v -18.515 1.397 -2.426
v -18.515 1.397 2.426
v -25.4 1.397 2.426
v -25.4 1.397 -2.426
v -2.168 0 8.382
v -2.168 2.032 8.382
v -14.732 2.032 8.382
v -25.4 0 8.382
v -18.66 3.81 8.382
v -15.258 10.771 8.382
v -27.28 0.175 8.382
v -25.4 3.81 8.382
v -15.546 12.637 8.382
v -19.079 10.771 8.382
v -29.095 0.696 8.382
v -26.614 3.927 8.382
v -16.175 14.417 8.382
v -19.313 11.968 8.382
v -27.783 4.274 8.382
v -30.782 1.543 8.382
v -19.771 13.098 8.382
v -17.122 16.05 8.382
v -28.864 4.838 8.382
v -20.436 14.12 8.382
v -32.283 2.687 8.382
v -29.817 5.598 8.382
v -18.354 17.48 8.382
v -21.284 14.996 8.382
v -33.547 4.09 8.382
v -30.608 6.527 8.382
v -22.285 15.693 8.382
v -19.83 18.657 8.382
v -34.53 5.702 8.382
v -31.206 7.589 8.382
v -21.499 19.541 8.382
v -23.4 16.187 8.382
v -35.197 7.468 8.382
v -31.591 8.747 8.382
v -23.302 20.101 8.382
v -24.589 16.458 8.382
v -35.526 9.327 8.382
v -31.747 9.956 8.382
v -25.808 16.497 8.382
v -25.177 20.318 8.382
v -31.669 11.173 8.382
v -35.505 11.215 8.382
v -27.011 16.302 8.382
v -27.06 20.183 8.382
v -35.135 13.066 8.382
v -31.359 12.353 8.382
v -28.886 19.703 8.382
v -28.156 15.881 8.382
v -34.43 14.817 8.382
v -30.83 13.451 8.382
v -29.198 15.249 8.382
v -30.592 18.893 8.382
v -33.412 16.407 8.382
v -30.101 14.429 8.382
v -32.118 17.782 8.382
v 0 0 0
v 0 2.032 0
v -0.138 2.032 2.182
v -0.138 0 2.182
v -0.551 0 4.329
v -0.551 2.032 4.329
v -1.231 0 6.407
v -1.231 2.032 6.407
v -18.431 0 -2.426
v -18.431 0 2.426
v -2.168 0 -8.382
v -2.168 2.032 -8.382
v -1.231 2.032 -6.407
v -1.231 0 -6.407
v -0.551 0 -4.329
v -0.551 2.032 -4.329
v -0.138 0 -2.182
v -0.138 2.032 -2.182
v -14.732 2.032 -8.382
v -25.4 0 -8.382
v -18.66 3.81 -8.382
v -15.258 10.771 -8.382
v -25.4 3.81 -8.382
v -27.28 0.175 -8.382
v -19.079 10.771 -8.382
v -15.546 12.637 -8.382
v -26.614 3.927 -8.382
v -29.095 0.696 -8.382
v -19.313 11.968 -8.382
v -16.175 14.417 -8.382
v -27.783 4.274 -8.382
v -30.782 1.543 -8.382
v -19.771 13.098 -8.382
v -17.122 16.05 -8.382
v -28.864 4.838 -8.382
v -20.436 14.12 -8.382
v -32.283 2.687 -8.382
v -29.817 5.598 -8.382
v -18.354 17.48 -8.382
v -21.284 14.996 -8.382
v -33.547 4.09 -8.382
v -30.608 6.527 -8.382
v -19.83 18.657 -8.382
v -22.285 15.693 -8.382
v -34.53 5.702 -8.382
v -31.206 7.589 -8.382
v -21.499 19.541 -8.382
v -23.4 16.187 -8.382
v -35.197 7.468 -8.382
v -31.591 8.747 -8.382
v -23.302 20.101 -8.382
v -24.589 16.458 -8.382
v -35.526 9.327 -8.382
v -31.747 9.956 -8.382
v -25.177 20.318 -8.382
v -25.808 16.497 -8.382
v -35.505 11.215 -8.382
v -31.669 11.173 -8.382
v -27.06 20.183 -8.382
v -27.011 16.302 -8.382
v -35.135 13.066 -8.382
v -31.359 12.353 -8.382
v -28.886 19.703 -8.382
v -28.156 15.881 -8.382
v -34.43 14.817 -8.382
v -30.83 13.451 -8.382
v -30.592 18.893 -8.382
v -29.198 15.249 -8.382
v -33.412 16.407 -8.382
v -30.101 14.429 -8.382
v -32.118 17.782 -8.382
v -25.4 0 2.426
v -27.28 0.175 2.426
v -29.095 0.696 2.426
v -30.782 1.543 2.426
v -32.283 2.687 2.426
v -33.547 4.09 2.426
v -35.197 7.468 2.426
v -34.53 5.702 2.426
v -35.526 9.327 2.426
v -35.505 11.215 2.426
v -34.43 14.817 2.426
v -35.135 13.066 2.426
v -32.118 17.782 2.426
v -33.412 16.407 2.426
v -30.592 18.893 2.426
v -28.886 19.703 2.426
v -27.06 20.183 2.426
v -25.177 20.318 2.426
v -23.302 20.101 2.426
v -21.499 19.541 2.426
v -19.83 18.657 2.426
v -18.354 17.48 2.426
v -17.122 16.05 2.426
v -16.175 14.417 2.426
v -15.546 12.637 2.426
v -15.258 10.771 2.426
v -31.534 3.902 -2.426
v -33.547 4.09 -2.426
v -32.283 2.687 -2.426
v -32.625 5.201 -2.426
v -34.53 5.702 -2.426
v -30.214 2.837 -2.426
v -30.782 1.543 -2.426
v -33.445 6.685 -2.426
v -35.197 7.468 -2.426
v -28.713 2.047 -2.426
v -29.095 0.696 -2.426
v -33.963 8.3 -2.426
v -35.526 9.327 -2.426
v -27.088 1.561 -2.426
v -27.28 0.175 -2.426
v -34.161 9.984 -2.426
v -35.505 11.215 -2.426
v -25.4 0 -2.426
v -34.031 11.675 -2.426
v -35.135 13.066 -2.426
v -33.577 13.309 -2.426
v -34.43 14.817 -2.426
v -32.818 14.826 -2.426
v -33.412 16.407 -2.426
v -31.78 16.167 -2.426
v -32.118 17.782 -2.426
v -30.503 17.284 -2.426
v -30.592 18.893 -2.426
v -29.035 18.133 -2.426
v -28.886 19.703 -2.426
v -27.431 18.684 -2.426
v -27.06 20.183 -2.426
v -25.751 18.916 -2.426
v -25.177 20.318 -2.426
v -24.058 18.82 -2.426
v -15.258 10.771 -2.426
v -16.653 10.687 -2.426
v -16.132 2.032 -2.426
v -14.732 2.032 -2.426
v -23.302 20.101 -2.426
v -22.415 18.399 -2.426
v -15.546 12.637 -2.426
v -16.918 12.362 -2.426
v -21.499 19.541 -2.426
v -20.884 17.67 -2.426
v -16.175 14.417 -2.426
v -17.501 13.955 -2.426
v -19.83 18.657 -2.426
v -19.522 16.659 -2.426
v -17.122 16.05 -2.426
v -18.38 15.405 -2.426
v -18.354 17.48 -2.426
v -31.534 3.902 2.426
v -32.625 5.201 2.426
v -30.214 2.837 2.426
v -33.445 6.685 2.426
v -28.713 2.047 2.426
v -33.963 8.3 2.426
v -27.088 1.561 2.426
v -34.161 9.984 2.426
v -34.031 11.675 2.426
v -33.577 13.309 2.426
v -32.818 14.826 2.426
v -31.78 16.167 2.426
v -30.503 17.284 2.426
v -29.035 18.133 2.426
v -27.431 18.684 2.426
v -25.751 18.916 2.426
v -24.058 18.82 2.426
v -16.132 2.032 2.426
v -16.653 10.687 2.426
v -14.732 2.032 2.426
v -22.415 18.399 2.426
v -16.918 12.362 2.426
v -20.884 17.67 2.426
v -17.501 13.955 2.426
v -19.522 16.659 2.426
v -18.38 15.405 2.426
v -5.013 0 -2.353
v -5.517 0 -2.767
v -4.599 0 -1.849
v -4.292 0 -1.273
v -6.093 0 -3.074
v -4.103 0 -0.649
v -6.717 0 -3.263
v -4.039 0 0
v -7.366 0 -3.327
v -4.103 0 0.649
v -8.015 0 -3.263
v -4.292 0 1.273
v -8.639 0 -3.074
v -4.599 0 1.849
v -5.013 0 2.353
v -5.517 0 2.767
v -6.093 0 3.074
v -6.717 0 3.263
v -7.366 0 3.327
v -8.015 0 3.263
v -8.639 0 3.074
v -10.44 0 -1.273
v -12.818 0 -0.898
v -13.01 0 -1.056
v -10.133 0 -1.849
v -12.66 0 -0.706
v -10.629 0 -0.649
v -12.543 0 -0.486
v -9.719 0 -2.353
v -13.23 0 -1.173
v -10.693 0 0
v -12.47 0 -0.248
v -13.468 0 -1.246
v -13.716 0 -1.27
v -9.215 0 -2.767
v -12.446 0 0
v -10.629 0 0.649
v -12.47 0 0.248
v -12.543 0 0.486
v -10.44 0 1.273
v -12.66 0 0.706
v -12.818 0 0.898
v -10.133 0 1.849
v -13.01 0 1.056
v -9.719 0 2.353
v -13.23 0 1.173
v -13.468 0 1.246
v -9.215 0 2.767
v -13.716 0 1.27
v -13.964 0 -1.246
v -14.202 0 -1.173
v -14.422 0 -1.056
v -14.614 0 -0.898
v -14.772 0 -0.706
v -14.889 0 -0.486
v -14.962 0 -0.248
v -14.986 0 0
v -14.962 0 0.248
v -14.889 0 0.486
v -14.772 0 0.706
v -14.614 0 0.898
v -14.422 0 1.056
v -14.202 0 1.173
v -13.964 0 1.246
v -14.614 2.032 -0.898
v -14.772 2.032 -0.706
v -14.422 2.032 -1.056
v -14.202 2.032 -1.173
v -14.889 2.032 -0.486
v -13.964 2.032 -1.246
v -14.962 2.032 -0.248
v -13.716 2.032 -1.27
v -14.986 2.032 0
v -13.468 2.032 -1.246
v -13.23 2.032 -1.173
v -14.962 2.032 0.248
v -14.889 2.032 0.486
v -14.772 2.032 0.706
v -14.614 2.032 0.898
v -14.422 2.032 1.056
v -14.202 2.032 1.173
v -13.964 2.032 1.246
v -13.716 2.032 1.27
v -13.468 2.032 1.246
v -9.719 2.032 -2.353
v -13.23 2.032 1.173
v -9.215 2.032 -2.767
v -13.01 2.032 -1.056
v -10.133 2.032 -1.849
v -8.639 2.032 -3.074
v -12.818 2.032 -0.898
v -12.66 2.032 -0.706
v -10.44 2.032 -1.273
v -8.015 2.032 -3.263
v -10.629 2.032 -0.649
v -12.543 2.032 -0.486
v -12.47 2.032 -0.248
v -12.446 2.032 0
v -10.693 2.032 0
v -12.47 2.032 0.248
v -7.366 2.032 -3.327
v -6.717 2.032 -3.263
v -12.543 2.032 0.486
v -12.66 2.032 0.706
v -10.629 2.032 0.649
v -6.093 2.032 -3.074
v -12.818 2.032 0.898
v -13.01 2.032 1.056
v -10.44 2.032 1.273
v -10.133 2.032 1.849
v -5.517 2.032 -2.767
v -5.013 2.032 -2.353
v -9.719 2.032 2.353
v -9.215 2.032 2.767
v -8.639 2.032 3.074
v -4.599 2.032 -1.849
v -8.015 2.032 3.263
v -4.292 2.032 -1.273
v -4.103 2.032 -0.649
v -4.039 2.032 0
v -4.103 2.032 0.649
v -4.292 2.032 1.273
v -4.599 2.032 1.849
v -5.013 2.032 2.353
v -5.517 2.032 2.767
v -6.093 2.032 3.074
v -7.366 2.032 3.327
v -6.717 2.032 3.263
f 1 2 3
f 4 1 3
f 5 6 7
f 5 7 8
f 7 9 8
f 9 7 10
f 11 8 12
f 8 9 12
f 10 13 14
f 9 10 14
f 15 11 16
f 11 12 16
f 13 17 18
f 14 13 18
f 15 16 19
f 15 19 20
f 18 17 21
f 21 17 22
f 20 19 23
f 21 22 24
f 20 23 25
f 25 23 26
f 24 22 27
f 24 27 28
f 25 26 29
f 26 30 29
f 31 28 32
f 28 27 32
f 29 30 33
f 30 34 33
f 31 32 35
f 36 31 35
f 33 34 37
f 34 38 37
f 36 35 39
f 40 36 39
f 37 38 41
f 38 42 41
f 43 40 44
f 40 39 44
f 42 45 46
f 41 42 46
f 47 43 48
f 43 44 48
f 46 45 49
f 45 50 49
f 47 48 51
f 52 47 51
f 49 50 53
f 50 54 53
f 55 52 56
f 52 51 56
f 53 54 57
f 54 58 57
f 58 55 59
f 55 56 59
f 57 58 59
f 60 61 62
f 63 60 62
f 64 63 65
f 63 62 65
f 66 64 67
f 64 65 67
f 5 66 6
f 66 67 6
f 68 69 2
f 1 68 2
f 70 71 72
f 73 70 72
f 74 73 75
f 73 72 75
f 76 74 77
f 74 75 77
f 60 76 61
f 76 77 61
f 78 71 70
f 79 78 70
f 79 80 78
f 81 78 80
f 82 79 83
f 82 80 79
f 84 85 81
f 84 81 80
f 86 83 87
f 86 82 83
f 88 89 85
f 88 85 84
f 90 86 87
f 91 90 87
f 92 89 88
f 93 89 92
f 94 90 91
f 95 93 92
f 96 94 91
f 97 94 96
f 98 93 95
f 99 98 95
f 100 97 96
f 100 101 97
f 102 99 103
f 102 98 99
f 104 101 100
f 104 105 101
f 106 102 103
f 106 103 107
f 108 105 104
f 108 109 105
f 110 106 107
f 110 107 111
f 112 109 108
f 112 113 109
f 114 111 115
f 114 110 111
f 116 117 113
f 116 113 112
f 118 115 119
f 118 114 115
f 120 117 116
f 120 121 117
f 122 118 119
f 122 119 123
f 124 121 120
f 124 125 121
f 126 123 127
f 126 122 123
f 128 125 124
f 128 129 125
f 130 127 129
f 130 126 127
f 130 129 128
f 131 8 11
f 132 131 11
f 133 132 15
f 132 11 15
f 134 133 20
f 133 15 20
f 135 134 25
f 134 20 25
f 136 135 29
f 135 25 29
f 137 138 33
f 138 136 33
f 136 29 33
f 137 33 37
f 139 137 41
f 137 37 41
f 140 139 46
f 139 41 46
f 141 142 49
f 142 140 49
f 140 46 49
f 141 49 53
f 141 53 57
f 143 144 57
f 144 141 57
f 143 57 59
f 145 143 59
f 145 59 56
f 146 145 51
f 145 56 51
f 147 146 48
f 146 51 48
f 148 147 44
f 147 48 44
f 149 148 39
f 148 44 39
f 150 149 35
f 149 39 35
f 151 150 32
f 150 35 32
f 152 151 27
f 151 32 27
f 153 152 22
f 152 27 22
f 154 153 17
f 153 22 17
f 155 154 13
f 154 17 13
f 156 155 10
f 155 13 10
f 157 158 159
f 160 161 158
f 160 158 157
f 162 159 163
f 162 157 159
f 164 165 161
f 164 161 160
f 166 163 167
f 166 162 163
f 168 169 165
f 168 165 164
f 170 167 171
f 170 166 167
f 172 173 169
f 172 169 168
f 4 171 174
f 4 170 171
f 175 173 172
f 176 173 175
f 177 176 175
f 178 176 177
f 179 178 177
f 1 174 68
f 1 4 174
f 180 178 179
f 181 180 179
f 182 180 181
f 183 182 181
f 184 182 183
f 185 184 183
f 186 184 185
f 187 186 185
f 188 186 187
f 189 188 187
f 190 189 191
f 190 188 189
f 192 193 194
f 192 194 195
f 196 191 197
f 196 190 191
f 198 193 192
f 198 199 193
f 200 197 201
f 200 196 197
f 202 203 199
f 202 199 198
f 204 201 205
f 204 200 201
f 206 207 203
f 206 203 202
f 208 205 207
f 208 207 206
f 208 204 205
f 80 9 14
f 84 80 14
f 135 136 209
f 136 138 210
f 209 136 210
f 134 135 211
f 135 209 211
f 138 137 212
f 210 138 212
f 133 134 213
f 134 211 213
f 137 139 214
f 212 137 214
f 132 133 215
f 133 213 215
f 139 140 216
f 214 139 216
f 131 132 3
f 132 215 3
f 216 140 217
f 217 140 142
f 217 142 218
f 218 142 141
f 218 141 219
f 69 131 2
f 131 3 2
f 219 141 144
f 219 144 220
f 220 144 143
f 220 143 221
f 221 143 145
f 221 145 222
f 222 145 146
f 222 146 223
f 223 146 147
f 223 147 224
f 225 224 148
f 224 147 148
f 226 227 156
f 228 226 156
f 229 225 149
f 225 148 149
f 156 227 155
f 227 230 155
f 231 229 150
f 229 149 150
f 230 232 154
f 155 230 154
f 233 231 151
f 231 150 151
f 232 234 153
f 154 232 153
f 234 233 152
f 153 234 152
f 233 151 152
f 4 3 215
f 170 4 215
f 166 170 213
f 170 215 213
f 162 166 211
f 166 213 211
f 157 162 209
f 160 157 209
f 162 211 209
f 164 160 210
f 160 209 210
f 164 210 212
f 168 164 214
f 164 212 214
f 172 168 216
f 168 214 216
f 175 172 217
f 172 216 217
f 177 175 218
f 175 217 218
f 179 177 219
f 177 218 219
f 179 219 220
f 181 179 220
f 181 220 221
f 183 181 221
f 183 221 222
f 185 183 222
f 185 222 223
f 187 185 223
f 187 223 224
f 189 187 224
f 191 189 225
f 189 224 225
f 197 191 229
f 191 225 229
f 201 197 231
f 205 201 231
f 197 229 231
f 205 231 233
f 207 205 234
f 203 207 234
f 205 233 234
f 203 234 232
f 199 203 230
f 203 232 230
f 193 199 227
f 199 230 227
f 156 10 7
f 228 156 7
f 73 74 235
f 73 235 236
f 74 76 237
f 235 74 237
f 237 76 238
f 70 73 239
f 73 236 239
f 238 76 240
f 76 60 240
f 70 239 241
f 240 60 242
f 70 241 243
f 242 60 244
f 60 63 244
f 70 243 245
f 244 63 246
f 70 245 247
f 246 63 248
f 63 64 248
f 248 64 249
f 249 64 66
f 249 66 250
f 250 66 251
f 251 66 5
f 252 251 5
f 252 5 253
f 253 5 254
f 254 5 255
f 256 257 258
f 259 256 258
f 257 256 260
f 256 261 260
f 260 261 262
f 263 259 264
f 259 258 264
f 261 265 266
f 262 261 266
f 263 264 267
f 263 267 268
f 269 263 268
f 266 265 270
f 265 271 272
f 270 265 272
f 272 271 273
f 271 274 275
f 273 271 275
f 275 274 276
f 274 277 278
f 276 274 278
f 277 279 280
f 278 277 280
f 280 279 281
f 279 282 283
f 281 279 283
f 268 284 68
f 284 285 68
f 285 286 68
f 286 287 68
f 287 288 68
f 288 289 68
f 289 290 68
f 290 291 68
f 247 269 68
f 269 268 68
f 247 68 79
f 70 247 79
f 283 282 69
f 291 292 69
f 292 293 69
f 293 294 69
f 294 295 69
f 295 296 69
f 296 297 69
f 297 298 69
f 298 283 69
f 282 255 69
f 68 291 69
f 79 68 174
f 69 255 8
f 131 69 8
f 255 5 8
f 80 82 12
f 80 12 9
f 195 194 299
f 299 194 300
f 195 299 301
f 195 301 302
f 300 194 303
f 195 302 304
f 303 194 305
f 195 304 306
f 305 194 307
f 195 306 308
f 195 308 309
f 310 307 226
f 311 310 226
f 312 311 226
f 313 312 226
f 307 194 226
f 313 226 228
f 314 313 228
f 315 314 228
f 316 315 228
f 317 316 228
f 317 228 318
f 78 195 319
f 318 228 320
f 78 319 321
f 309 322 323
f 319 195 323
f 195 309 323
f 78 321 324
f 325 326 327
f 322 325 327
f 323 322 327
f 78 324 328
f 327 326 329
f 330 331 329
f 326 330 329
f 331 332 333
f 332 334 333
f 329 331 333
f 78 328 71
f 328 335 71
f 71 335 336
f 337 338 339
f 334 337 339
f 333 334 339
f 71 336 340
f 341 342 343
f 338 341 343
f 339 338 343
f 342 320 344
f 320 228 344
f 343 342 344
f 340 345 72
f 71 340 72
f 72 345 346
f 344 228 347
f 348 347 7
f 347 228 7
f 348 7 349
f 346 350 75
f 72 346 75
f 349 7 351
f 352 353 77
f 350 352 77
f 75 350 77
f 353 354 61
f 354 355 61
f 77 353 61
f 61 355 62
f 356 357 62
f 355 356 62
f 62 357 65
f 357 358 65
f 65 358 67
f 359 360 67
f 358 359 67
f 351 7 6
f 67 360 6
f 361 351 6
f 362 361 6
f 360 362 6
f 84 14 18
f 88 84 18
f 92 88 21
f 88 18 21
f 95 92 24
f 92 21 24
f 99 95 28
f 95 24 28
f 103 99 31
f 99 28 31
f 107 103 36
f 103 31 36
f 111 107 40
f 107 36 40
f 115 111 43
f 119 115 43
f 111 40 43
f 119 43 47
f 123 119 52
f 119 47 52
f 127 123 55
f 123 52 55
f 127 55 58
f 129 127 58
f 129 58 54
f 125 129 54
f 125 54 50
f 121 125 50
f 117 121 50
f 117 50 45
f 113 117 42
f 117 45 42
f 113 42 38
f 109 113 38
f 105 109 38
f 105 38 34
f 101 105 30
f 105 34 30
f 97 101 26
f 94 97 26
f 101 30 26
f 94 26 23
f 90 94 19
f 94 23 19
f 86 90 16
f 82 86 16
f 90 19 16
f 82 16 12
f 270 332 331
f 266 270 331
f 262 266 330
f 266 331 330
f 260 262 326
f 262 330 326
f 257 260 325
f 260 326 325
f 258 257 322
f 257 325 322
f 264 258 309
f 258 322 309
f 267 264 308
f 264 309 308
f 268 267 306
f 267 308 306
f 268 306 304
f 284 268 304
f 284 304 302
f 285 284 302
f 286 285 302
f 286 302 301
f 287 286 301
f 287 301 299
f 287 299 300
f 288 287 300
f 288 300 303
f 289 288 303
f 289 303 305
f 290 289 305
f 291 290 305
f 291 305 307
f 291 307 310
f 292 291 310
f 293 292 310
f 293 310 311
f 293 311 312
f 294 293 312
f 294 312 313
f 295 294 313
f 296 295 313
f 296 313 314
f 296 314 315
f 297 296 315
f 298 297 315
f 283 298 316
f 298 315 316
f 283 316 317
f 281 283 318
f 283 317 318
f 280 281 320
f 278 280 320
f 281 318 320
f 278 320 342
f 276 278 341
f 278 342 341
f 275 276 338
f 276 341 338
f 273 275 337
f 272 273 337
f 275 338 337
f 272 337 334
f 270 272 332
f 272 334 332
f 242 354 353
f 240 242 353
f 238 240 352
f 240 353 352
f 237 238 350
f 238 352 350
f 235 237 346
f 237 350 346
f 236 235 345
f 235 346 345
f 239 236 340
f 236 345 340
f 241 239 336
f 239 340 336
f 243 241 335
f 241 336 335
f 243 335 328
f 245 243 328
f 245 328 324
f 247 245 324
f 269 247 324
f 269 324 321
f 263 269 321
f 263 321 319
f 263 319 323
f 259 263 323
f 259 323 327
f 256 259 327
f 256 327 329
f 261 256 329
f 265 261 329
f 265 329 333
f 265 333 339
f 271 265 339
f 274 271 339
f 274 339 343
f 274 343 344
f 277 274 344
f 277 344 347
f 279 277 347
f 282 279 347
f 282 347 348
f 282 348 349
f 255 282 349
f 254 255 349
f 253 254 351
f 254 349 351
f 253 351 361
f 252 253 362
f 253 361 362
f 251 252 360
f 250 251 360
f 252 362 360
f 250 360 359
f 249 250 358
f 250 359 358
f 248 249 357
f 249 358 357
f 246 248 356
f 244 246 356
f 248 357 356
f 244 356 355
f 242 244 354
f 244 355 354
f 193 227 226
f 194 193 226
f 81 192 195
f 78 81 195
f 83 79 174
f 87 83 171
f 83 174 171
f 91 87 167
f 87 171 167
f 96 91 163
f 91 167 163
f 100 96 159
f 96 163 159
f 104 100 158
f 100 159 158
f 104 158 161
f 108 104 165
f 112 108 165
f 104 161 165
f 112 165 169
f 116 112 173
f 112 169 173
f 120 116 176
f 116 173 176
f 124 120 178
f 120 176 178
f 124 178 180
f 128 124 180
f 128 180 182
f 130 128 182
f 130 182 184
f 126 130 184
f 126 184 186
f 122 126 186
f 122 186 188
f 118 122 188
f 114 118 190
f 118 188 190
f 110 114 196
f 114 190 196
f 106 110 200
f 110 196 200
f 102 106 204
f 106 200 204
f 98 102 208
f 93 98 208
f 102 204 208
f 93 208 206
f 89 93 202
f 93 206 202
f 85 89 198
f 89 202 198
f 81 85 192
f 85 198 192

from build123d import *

# Parameters (mm, degrees)
BOSS_EXTRUDE1_DEPTH = 8.382
CUT_EXTRUDE2_DEPTH  = 2.032
SKETCH4_R           = 3.3274
SKETCH4_R_2         = 1.27
CUT_EXTRUDE3_DEPTH  = 3.032
CUT_EXTRUDE4_DEPTH  = 2.4257


with BuildPart() as part:
    # Sketch1 → Boss-Extrude1 (new body, symmetric)
    with BuildSketch(Plane.XY):
        with BuildLine():
            Line((0, 0), (-25.4, 0))
            ThreePointArc((-25.4, 0), (-32.797029365, 17.124880227), (-15.258381189, 10.77087469))
            Line((-15.258381189, 10.77087469), (-14.732, 2.032))
            Line((-14.732, 2.032), (0, 2.032))
            Line((0, 2.032), (0, 0))
        make_face()
        with BuildLine():
            Line((-25.4, 3.81), (-18.660167236, 3.81))
            Line((-18.660167236, 3.81), (-19.079451597, 10.77087469))
            ThreePointArc((-19.079451597, 10.77087469), (-30.101146364, 14.428691001), (-25.4, 3.81))
        make_face(mode=Mode.SUBTRACT)
    extrude(amount=BOSS_EXTRUDE1_DEPTH, both=True)

    # Sketch3 → Cut-Extrude2 (cut)
    with BuildSketch(Plane(origin=(0, 2.032, 0), x_dir=(1, 0, 0), z_dir=(0, 1, 0))):
        with BuildLine():
            Line((0, -8.382), (0, 0))
            ThreePointArc((0, 0), (-0.55079832, -4.328930418), (-2.168093689, -8.382))
            Line((-2.168093689, -8.382), (0, -8.382))
        make_face()
        with BuildLine():
            Line((0, 0), (0, 8.382))
            Line((0, 8.382), (-2.168093689, 8.382))
            ThreePointArc((-2.168093689, 8.382), (-0.55079832, 4.328930418), (0, 0))
        make_face()
    extrude(amount=-CUT_EXTRUDE2_DEPTH, mode=Mode.SUBTRACT)

    # Sketch4 → Cut-Extrude3 (cut, through all)
    with BuildSketch(Plane(origin=(0, 2.032, 0), x_dir=(1, 0, 0), z_dir=(0, 1, 0))):
        with Locations((-7.366, 0)):
            Circle(SKETCH4_R)
        with Locations((-13.716, 0)):
            Circle(SKETCH4_R_2)
    extrude(amount=-CUT_EXTRUDE3_DEPTH, mode=Mode.SUBTRACT)

    # Sketch5 → Cut-Extrude4 (cut, symmetric)
    with BuildSketch(Plane.XY):
        with BuildLine():
            Line((-25.4, 0), (-18.430674034, 0))
            Line((-18.430674034, 0), (-18.514821541, 1.397))
            Line((-18.514821541, 1.397), (-25.4, 1.397))
            ThreePointArc((-25.4, 1.397), (-31.779937827, 16.167209196), (-16.652853775, 10.68687942))
            Line((-16.652853775, 10.68687942), (-16.131531994, 2.032))
            Line((-16.131531994, 2.032), (-14.732, 2.032))
            Line((-14.732, 2.032), (-15.258381189, 10.77087469))
            ThreePointArc((-15.258381189, 10.77087469), (-32.797029365, 17.124880227), (-25.4, 0))
        make_face()
    extrude(amount=CUT_EXTRUDE4_DEPTH, both=True, mode=Mode.SUBTRACT)


solid = part.part
